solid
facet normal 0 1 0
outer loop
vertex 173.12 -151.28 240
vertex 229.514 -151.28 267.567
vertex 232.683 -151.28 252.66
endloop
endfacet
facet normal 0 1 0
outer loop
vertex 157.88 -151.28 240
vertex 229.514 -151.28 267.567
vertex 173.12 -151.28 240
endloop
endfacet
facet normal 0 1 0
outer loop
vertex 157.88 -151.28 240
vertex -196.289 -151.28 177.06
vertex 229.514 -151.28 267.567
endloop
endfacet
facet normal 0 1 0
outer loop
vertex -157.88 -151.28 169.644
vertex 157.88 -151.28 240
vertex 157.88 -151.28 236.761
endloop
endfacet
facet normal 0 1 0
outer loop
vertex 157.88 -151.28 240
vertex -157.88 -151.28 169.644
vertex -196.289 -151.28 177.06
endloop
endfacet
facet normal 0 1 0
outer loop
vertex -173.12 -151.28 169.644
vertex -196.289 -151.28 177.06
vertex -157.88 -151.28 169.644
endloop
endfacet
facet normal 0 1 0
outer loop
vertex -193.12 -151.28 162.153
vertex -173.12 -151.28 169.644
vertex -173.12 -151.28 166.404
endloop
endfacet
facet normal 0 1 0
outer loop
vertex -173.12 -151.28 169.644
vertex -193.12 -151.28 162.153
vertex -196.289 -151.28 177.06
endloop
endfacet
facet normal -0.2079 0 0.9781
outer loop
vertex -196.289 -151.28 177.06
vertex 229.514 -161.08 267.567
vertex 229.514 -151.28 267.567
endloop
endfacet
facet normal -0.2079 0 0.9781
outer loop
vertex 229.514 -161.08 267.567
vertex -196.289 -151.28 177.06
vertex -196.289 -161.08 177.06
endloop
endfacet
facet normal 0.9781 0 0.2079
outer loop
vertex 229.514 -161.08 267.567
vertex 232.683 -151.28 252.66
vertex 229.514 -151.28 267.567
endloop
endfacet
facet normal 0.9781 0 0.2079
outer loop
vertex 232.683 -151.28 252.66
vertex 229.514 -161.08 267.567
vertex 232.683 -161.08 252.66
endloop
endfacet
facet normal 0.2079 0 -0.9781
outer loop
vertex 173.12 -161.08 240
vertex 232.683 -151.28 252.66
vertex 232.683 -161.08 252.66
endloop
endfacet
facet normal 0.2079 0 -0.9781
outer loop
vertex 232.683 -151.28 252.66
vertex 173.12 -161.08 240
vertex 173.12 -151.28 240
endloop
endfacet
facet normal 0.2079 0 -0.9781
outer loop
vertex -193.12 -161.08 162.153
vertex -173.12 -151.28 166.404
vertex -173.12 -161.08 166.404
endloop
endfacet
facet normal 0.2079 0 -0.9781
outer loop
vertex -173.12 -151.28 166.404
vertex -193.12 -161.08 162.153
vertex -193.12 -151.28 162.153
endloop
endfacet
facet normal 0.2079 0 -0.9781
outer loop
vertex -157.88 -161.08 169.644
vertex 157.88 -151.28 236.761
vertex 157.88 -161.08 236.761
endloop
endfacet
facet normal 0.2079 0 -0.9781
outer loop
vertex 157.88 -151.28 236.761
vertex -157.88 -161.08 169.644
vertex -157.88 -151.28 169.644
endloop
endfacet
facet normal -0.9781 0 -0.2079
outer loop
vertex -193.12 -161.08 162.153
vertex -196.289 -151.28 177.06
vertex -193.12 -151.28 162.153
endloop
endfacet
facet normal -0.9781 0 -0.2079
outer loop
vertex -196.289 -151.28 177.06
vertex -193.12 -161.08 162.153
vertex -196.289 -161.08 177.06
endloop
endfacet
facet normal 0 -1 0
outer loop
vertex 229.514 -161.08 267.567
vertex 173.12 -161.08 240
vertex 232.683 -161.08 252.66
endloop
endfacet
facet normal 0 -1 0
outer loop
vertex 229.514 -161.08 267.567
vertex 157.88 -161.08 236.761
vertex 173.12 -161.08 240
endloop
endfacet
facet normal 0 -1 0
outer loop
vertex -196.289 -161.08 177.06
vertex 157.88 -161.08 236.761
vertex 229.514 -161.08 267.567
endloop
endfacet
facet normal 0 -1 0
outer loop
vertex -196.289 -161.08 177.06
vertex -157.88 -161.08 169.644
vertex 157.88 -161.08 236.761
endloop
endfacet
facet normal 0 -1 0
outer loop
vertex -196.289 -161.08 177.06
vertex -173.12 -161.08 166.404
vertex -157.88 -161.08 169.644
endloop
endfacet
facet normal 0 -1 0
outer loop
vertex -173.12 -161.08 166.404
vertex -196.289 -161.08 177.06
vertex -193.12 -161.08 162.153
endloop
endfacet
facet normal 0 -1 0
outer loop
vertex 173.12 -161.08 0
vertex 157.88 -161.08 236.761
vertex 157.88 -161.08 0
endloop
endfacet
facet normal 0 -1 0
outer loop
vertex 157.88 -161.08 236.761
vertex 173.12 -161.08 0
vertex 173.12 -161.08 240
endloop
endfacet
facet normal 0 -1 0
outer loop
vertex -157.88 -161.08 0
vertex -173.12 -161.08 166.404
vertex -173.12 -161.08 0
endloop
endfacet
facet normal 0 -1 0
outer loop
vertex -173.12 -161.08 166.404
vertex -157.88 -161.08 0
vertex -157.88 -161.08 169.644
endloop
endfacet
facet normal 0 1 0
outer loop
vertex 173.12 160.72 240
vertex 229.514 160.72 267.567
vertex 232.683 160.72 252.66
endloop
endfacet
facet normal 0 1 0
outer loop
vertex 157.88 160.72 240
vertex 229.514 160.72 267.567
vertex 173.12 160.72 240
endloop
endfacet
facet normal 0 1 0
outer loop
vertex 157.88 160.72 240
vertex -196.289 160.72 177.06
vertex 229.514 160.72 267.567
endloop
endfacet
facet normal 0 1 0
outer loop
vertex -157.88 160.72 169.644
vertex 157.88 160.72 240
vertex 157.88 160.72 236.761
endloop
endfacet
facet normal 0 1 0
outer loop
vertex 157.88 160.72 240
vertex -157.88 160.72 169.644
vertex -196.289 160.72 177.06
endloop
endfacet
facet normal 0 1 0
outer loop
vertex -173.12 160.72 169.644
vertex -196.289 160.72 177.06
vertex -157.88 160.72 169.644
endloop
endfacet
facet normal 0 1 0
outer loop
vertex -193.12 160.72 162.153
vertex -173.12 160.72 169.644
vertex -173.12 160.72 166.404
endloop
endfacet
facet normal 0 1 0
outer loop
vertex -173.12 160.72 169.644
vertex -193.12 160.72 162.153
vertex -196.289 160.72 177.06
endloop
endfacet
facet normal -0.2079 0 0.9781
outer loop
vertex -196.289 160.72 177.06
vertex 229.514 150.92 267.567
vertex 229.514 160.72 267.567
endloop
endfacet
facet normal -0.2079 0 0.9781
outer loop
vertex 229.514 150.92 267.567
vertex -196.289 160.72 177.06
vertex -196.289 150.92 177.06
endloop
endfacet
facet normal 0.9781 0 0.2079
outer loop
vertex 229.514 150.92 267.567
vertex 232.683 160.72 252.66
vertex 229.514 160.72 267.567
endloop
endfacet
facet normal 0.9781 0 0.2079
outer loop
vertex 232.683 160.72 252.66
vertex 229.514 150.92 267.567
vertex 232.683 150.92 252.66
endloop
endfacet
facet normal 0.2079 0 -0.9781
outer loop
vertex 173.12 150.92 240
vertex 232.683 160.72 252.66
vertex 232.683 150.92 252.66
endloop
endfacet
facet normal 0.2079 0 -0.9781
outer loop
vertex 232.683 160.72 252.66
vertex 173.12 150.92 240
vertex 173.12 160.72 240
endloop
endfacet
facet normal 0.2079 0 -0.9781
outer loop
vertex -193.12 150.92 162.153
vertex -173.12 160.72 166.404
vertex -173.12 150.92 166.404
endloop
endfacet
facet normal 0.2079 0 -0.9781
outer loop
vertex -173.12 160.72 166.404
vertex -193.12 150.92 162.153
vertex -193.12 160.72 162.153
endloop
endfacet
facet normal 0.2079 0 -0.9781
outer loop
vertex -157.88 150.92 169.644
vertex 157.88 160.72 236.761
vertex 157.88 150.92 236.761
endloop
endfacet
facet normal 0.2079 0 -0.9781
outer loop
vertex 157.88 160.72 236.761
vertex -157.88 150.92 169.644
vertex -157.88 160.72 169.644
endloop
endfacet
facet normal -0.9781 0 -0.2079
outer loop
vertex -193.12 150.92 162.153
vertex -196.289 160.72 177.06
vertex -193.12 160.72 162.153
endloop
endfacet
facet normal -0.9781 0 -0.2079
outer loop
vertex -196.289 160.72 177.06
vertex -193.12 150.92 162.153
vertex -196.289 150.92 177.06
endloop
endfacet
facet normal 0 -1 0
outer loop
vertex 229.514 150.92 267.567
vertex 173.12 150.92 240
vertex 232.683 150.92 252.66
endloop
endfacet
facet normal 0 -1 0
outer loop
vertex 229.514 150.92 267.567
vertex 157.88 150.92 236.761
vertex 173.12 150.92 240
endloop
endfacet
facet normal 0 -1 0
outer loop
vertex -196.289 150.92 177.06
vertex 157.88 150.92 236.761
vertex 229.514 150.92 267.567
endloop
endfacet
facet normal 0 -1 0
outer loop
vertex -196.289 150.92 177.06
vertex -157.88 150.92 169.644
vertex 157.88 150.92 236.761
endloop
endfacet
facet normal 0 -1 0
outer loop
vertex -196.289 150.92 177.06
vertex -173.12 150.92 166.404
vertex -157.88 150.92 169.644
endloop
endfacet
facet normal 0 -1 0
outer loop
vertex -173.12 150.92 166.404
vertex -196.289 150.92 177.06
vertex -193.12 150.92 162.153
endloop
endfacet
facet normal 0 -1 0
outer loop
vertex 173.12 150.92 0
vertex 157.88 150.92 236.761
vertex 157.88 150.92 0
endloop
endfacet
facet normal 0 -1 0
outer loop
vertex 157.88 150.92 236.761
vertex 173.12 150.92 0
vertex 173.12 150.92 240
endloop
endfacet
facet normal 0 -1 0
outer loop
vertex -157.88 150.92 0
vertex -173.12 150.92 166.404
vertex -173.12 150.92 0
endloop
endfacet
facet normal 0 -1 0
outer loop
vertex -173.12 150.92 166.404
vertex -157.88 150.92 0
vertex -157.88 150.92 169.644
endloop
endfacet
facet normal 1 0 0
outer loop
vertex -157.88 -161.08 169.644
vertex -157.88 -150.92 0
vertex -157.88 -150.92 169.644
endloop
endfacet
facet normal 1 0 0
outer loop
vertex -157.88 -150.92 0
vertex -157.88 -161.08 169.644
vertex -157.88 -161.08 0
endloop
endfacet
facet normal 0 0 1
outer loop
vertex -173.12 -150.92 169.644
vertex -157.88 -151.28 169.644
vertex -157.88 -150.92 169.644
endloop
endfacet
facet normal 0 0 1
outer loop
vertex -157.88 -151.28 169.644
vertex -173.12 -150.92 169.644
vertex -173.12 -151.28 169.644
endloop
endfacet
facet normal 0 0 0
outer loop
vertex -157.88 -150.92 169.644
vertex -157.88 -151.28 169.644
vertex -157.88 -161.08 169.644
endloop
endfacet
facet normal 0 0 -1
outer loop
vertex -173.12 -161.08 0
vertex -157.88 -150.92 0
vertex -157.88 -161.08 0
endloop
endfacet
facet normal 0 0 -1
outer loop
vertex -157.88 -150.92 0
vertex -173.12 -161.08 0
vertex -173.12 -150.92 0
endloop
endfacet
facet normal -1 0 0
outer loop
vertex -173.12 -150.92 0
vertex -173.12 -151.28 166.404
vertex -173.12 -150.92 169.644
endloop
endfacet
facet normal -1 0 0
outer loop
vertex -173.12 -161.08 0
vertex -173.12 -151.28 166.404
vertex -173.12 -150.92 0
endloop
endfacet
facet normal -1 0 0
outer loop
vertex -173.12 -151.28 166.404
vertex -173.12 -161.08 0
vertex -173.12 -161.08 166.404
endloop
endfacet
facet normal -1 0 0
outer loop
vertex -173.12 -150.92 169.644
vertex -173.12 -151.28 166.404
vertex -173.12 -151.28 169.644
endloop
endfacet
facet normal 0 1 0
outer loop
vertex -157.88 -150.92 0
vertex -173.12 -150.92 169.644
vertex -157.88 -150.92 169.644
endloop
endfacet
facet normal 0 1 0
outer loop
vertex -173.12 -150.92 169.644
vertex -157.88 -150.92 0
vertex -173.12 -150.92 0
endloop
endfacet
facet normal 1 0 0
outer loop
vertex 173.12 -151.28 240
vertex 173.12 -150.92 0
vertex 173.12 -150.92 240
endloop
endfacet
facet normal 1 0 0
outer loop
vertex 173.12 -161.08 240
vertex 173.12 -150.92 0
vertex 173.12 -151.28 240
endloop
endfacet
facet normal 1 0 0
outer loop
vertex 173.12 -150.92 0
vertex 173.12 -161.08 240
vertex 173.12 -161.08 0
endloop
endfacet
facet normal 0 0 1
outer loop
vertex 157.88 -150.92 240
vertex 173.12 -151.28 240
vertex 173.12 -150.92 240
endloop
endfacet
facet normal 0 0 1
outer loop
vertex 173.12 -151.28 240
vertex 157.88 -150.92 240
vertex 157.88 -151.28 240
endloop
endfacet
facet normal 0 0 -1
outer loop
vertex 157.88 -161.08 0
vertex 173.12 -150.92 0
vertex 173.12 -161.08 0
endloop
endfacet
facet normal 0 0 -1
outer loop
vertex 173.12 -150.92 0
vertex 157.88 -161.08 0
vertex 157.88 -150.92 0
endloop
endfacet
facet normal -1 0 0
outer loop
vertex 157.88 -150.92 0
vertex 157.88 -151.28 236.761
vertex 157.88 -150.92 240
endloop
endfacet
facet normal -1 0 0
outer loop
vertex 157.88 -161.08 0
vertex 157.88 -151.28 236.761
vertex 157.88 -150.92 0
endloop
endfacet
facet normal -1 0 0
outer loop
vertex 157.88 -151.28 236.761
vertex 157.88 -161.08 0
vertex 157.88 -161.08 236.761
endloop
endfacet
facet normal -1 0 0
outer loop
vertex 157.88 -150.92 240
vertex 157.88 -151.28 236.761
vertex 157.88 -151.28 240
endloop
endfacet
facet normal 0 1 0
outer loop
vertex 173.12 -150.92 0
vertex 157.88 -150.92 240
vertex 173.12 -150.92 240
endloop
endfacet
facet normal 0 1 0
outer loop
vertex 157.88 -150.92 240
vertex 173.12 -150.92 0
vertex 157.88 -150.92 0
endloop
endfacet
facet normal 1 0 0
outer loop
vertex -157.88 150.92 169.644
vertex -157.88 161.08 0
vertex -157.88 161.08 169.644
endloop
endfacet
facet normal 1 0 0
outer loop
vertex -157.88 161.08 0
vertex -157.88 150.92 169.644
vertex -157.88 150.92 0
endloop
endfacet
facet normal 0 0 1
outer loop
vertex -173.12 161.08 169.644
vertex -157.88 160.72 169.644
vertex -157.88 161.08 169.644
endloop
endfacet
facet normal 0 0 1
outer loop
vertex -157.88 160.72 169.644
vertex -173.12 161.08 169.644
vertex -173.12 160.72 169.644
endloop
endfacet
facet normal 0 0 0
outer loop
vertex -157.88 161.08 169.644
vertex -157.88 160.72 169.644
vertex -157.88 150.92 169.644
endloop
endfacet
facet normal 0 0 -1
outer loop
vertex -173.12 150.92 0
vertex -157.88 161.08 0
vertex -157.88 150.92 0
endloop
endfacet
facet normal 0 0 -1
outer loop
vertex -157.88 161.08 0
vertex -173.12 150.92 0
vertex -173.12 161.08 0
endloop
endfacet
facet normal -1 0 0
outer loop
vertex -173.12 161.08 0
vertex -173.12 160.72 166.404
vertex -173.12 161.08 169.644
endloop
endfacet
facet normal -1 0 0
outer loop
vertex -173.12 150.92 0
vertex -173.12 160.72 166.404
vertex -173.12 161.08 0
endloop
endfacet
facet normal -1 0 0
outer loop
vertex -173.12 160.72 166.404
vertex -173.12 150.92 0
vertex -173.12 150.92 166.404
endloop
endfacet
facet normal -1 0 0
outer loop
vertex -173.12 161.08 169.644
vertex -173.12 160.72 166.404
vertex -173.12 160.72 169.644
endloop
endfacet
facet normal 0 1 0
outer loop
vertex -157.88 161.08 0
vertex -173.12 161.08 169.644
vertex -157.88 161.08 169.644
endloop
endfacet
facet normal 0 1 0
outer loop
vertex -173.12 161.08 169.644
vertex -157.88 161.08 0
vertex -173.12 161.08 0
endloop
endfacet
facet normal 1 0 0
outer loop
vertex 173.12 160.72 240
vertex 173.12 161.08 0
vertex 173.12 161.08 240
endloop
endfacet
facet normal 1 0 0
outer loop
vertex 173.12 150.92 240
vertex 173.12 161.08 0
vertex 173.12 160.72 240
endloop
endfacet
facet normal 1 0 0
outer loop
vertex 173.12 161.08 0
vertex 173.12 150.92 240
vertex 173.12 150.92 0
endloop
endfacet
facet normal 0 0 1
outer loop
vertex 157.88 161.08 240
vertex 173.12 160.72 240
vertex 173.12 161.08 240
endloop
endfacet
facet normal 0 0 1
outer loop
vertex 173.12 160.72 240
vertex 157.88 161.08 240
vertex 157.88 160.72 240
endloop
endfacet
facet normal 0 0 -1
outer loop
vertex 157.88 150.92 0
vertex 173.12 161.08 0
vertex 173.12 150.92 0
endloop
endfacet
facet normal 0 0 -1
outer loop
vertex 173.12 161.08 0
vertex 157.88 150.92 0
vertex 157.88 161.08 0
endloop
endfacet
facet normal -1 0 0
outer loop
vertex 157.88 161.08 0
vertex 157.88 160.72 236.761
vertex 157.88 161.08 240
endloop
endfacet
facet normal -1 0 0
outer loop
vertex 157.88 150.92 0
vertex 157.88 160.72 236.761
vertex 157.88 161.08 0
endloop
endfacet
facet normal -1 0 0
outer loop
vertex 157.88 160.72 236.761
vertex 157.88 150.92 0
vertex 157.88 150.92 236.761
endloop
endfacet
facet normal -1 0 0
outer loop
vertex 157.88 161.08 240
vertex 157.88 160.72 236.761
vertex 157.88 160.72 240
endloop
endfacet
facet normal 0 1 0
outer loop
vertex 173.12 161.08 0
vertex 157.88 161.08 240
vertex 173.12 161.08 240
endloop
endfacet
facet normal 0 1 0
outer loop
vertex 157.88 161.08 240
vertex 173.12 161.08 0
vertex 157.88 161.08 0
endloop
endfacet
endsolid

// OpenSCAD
//-------------------------------------------
//-------PARAMETRE---------------------------
//-------------------------------------------

stolpeDimensjonBredde = 10.16; //4tommer
stolpeDimensjonDybde = 15.24; //6tommer

dragerDimensjonBredde = 9.8; //4tommer
dragerDimensjonHoyde = 19.8; //6tommer

skraDragerDimensjonHoyde = 15.24; //4tommer
skraDragerDimensjonDybde = 9.8; //6tommer

stolpeskoAvstandKortside = 312; 
stolpeskoAvstandLangside = 331;

stolpeHoydeVest = 240;

takVinkel = 12;

//takutsprng målt rett ut fra veggen
takUtspringOst = 20;
takUtspringVest = 60;

//-------------------------------------------
//-------PROGRAM-----------------------------
//-------------------------------------------
stolpeHoydeForskjell = stolpeskoAvstandLangside * tan(takVinkel);
stolpeHoydeOst = stolpeHoydeVest - stolpeHoydeForskjell;

nordOstSenter = [stolpeskoAvstandLangside/-2,stolpeskoAvstandKortside/-2,0];

nordVestSenter = [stolpeskoAvstandLangside/2,stolpeskoAvstandKortside/-2,0];

sorOstSenter = [stolpeskoAvstandLangside/-2,stolpeskoAvstandKortside/2,0];

sorVestSenter = [stolpeskoAvstandLangside/2,stolpeskoAvstandKortside/2,0];

stolpeSenter = [stolpeDimensjonDybde*-0.5,stolpeDimensjonBredde*-0.5,0];

translate(stolpeSenter) {
    //Skrådrager hjelpekalkulasjoner
    lengdeJusteringStolpeDydbe = stolpeDimensjonDybde / cos(takVinkel);
    hoydeJusteringStolpe = stolpeDimensjonDybde * tan(takVinkel);
    hoydejusteringUtspringOst = takUtspringOst * tan(takVinkel);
    lengdeJusteringUtspringVest = takUtspringVest / cos(takVinkel);
    stolpeTilStolpe = sqrt( stolpeskoAvstandLangside ^ 2 + 
            stolpeHoydeForskjell ^ 2);
    skraDragerLengde = takUtspringOst +
            stolpeTilStolpe + 
            lengdeJusteringStolpeDydbe +
            lengdeJusteringUtspringVest;
    
    translate([takUtspringOst * -1, 0, stolpeHoydeOst-hoydeJusteringStolpe-hoydejusteringUtspringOst]) {

        //Nordre 
        translate(nordOstSenter) {
            rotate(a = takVinkel, v = [0 ,-1 ,0 ]) {
                cube([skraDragerLengde,
                    skraDragerDimensjonDybde,
                    skraDragerDimensjonHoyde]);
            }
        }
        
        //Søndre
        translate(sorOstSenter) {
            rotate(a = takVinkel, v = [0 ,-1 ,0 ]) {
                cube([skraDragerLengde,
                    skraDragerDimensjonDybde,
                    skraDragerDimensjonHoyde]);
            }
        }
    }

    translate(nordOstSenter) {
        stolpe(stolpeHoydeOst);
    }

    translate(nordVestSenter) {
        stolpe(stolpeHoydeVest);
    }

    translate(sorOstSenter) {
        stolpe(stolpeHoydeOst);
    }

    translate(sorVestSenter) {
        stolpe(stolpeHoydeVest);
    }
    
}



//-------------------------------------------
//-------MODULER-----------------------------
//-------------------------------------------

module stolpe(hoyde) {
    cube([stolpeDimensjonDybde,stolpeDimensjonBredde,hoyde]);
}
